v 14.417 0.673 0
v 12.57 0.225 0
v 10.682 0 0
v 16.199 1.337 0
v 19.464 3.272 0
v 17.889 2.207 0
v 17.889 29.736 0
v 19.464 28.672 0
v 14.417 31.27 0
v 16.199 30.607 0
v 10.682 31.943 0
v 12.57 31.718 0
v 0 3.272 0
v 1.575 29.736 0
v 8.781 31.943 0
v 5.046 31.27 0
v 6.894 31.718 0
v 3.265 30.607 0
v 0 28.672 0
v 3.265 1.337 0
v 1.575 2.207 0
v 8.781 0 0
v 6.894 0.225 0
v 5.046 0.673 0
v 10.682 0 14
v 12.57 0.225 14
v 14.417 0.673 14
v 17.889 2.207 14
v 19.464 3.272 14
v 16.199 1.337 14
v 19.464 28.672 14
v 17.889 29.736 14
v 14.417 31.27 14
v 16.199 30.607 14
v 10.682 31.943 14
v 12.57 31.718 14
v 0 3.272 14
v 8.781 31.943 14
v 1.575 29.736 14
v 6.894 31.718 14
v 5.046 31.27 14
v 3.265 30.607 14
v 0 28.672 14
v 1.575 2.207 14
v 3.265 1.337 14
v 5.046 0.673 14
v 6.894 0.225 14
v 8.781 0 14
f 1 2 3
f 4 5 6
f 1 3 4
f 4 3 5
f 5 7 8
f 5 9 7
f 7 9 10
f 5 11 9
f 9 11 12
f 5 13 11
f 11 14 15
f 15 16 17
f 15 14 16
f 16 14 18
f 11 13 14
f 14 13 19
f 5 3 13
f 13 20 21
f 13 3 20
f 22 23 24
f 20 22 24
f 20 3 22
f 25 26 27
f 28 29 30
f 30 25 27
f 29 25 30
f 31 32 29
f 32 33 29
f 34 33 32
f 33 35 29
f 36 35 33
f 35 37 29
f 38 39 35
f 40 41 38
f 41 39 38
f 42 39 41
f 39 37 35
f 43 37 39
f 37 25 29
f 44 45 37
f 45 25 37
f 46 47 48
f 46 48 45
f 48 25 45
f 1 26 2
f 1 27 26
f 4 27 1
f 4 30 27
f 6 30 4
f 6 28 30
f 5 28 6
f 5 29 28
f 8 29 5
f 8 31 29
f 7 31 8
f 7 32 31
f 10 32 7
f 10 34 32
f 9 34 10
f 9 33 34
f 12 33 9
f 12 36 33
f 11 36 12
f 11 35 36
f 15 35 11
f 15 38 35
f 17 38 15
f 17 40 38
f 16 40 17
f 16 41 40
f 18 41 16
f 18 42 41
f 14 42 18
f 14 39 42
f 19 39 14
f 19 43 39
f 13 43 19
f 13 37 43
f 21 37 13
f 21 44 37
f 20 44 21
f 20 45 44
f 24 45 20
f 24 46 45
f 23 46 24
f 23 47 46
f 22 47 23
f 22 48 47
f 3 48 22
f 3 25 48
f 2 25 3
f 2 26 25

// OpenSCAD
$fn = 32;

// ----------------------------------------------------------------------
// Flat adaptor: double_d, 14 mm thick
// ----------------------------------------------------------------------

// --- parameters (mm) ---
profile_height = 14;      // extrusion height
profile_points = 24;      // points of the closed outline

profile = [[19.464, 28.672], [17.889, 29.736], [16.199, 30.607], [14.417, 31.27], [12.57, 31.718], [10.682, 31.943], [8.781, 31.943], [6.894, 31.718], [5.046, 31.27], [3.265, 30.607], [1.575, 29.736], [0, 28.672], [0, 3.272], [1.575, 2.207], [3.265, 1.337], [5.046, 0.673], [6.894, 0.225], [8.781, 0], [10.682, 0], [12.57, 0.225], [14.417, 0.673], [16.199, 1.337], [17.889, 2.207], [19.464, 3.272]];  // single closed polygon, 24 points, counter clockwise

// --- the one profile operation ---
linear_extrude(height = profile_height) polygon(points = profile);
